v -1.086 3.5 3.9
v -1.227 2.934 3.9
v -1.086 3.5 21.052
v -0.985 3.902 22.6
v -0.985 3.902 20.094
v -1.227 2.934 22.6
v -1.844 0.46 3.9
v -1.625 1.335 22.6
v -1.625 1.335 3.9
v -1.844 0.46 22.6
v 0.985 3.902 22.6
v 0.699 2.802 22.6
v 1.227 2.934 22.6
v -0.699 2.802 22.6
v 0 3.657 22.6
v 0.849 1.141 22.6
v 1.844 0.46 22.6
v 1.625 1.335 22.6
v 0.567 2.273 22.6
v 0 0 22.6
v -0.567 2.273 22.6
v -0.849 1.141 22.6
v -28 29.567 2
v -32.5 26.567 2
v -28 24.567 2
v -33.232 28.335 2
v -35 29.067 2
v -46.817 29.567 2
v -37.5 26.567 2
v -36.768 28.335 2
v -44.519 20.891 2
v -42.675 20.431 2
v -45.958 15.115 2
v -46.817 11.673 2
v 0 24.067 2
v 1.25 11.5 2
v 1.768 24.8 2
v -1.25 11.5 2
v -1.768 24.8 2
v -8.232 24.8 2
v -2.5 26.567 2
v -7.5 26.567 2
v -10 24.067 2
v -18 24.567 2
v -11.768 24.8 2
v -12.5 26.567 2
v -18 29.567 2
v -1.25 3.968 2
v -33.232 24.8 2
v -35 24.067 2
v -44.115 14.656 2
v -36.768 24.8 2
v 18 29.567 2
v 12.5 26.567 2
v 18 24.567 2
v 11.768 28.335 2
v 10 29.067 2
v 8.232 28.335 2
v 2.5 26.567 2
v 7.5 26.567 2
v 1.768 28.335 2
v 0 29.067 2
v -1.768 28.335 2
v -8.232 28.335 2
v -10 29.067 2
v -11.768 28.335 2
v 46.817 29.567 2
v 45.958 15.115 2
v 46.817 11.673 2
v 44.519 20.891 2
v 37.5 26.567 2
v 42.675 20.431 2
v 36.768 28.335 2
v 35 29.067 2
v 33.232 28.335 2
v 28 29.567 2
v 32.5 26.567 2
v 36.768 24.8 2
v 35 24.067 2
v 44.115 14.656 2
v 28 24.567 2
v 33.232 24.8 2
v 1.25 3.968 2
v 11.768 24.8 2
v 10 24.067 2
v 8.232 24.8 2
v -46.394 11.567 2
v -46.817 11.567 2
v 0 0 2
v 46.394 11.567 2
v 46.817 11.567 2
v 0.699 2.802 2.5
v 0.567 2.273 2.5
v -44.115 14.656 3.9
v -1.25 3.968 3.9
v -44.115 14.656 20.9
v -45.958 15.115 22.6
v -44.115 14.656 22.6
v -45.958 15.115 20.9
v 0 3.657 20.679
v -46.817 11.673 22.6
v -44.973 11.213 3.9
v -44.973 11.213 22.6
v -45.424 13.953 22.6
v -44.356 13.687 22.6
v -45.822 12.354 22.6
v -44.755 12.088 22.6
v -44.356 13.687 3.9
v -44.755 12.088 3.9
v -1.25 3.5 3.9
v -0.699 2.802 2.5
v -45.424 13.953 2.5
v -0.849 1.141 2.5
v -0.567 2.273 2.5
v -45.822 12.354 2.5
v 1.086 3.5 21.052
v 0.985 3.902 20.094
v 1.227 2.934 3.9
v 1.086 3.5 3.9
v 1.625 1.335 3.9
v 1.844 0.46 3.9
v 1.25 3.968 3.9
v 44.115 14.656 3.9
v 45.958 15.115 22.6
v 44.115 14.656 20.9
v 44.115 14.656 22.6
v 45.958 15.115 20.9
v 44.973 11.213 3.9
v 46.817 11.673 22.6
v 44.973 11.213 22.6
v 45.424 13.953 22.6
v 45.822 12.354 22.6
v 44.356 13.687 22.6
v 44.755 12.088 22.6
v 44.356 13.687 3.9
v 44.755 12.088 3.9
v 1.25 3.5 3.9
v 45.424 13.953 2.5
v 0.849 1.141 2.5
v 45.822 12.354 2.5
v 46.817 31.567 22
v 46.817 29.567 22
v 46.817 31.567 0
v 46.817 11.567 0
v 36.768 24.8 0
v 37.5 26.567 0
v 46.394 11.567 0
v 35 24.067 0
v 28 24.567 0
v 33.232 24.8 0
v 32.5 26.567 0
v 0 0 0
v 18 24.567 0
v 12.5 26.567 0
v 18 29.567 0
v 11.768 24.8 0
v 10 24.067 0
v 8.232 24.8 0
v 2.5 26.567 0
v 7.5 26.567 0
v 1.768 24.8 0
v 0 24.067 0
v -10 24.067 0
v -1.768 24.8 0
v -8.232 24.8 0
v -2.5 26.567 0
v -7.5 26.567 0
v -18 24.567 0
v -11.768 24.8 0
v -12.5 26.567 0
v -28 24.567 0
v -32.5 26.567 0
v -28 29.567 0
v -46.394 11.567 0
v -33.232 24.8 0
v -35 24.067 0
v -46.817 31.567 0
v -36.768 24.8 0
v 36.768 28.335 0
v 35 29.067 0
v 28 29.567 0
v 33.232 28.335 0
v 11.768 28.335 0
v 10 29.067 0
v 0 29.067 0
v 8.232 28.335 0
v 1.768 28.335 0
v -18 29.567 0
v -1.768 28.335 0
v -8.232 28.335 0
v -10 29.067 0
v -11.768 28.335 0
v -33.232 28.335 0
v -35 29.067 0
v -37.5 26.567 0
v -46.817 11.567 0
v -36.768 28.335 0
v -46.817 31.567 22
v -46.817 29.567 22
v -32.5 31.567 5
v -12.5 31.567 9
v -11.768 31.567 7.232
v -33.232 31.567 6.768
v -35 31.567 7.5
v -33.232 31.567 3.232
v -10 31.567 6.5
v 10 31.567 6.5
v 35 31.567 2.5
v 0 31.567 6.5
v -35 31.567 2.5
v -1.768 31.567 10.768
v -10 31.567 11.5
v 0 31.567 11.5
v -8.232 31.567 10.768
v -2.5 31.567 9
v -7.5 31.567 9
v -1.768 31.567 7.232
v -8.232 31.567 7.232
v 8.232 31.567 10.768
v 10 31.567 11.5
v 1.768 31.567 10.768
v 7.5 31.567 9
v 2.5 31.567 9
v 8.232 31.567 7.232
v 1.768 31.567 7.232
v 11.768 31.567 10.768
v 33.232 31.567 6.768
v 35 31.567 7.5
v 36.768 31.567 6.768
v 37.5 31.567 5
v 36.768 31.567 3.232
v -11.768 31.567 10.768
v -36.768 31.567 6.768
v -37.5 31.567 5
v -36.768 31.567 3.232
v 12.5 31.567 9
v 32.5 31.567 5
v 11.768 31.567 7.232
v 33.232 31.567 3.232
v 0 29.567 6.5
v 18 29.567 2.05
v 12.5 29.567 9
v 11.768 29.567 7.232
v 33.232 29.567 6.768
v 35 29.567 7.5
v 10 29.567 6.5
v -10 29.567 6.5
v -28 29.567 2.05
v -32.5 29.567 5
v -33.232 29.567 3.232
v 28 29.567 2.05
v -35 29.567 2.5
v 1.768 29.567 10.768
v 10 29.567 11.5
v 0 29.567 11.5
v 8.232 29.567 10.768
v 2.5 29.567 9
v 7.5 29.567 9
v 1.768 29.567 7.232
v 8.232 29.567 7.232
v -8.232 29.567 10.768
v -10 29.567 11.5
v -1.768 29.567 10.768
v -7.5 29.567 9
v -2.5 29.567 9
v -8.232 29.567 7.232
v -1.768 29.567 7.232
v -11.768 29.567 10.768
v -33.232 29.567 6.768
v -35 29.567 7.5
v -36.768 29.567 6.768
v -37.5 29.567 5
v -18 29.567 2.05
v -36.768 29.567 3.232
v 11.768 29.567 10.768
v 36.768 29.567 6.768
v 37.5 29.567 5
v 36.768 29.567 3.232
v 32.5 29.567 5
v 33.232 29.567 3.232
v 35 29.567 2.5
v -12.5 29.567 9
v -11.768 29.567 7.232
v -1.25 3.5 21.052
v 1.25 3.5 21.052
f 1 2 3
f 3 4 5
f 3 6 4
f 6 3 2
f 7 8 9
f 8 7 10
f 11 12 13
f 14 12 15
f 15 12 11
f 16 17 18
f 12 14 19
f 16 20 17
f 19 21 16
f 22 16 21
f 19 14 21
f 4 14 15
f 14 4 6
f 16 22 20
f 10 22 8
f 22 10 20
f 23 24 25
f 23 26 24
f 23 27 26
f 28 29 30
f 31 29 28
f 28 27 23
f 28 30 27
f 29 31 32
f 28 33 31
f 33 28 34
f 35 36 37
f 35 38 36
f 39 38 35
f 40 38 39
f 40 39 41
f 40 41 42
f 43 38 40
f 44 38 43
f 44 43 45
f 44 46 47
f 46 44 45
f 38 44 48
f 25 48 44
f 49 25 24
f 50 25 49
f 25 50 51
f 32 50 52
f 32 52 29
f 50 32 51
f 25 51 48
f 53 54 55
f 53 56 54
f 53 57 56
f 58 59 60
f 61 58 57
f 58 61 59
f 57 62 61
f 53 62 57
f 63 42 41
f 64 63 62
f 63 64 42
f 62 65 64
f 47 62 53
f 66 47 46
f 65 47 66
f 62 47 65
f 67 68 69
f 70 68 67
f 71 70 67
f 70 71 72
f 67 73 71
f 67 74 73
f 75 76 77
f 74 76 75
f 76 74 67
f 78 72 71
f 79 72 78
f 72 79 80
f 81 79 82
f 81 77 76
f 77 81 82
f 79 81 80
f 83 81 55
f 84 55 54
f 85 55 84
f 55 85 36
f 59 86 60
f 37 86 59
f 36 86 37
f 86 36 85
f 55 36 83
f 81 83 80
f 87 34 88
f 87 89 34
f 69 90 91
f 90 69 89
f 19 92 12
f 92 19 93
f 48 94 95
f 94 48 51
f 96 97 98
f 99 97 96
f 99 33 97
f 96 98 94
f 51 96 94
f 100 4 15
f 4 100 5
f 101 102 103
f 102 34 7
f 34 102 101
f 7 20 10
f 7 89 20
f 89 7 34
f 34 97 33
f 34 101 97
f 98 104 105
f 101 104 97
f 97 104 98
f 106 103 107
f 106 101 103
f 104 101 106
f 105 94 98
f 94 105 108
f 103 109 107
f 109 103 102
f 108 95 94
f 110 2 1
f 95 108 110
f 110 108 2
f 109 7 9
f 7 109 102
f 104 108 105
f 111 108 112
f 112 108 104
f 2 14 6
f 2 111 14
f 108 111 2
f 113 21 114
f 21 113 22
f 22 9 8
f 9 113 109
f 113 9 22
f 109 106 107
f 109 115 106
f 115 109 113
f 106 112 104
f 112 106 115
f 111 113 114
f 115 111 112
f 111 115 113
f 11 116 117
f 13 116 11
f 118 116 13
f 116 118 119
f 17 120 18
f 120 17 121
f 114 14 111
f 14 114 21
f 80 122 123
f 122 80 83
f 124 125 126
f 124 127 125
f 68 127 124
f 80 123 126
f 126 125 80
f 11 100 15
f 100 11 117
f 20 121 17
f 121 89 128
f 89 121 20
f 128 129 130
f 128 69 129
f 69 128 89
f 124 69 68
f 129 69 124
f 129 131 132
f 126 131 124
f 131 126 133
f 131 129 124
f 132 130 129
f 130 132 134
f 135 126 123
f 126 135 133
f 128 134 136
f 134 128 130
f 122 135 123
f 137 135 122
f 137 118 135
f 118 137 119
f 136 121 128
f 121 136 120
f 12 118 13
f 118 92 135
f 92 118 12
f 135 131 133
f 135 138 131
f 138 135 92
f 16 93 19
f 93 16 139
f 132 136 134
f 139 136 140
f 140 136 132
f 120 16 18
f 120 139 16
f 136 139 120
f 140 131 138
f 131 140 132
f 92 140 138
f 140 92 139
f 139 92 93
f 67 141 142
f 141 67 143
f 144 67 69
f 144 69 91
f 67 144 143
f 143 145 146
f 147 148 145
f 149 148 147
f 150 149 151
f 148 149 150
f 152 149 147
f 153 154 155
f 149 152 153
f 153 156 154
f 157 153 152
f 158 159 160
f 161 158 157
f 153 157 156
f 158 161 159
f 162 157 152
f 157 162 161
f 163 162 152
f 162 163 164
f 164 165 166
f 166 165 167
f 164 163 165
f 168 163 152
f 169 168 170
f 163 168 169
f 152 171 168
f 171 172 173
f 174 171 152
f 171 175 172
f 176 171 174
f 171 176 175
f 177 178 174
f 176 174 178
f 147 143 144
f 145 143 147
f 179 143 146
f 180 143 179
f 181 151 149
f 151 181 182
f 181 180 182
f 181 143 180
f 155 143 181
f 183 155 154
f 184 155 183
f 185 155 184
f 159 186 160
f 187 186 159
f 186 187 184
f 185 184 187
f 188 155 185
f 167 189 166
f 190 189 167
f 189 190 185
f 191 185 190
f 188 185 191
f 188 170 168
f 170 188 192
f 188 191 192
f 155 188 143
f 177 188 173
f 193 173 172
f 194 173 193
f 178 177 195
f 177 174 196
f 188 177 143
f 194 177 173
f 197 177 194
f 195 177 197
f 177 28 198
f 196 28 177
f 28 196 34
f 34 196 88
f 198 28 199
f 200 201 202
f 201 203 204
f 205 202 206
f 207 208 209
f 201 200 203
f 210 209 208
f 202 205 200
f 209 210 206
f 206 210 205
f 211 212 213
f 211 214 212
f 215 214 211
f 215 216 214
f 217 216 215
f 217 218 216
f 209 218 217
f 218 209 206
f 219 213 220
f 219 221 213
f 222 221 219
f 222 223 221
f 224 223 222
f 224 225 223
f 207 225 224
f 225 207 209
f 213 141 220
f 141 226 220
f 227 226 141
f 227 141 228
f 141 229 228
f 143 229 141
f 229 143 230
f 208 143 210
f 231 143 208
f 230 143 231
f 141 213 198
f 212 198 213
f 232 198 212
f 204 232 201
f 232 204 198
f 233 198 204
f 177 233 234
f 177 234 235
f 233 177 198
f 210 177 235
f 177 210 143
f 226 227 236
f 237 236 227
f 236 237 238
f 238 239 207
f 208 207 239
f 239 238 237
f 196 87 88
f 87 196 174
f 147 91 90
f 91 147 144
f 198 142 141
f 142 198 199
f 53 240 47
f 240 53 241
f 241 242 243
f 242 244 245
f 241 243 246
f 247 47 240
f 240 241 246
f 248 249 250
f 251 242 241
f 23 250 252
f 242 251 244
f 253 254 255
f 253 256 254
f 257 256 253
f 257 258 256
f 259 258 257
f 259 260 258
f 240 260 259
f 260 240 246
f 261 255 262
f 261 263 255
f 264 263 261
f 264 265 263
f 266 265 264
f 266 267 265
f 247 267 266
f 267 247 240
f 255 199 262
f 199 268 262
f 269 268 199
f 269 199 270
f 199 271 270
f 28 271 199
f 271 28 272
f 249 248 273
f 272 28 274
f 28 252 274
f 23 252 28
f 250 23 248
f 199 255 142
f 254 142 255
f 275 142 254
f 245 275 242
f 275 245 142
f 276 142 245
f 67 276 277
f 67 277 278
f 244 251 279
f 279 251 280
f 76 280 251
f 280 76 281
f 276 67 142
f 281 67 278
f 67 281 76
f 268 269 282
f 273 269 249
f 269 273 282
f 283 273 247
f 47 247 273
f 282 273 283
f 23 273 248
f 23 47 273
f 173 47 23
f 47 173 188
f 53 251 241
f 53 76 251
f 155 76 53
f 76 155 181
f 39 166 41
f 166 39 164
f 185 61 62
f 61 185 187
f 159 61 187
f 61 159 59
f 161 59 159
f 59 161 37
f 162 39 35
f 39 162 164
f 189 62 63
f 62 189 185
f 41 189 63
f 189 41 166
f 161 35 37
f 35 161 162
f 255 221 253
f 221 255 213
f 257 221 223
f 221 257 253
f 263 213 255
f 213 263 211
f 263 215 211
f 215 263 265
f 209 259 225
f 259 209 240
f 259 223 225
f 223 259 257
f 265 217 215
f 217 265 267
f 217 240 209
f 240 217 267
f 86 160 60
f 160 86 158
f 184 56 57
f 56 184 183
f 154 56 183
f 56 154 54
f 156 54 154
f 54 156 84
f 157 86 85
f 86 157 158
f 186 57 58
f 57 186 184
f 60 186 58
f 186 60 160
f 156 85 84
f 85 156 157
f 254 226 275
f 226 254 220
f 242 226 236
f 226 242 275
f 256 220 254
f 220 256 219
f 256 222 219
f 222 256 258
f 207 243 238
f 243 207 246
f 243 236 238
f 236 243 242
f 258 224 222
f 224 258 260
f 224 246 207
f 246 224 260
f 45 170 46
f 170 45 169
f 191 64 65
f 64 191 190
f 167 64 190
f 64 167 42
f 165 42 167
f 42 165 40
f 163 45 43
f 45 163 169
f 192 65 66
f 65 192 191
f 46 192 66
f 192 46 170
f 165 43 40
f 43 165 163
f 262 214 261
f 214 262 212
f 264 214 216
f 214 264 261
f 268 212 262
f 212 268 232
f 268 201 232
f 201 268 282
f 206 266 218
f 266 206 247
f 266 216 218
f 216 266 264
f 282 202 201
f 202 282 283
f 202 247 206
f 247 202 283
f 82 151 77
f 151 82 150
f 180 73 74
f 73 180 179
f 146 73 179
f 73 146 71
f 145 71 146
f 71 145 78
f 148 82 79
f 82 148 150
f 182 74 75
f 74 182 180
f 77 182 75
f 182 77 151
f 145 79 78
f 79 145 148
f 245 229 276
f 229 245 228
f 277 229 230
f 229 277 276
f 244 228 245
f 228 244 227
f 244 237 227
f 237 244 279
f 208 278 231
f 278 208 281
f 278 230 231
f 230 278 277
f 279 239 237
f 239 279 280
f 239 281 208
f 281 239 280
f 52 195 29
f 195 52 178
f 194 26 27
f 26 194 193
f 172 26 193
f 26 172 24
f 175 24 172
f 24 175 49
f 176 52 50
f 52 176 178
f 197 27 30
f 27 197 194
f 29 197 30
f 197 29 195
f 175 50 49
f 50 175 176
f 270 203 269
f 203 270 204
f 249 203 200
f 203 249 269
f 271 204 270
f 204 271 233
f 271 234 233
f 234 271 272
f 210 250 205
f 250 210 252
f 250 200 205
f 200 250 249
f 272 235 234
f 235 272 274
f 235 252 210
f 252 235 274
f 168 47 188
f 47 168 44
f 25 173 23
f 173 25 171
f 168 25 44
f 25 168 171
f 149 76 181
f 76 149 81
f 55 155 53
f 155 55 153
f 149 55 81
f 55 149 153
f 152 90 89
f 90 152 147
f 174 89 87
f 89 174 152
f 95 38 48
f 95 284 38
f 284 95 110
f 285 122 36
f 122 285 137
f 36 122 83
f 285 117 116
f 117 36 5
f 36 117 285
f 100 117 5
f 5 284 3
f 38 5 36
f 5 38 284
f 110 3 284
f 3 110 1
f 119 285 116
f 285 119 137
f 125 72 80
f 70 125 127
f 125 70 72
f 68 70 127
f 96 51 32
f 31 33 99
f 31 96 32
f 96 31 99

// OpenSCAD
// file: Common.scad
/* Constants */
// HC49S
HC49S_BASE_X = 10.3; // mm
HC49S_BASE_Y = 4.6; // mm
HC49S_BASE_HEIGHT = 3.8; // mm
HC49S_CRYSTAL_Y = HC49S_BASE_Y - 0.8;

/* Crystal (HC49S) */
module Crystal_HC49S()
{
    CENTER_OFFSET = HC49S_BASE_X / 2 - HC49S_BASE_Y / 2;
    color("silver") union()
	{
		// Base
		hull()
		{
			translate([-CENTER_OFFSET, 0, 0]) cylinder(r=HC49S_BASE_Y/2, h=0.4, $fn=60);
			translate([CENTER_OFFSET, 0, 0]) cylinder(r=HC49S_BASE_Y/2, h=0.4, $fn=60);
		}
	
		// Crystal
		hull()
		{
			translate([-CENTER_OFFSET, 0, 0]) cylinder(r=HC49S_CRYSTAL_Y/2, h=HC49S_BASE_HEIGHT, $fn=60);
			translate([CENTER_OFFSET, 0, 0]) cylinder(r=HC49S_CRYSTAL_Y/2, h=HC49S_BASE_HEIGHT, $fn=60);
		}
	}
}

//Crystal_HC49S();
// file: HC-SR04.scad
/*
    Dimensions taken from:
    - https://cdn.sparkfun.com/datasheets/Sensors/Proximity/HCSR04.pdf
    - https://howtomechatronics.com/wp-content/uploads/2022/02/HC-SR04-Ultrasonic-Sensor-Dimensions.png
*/

include <Common.scad>

/* Constants */
// PCB
HC_SR04_PCB_COLOR = "#00467E";
HC_SR04_PCB_X = 45; // mm
HC_SR04_PCB_Y = 20; // mm
HC_SR04_PCB_Z = 1.6; // mm (thickness)
// Sensor
HC_SR04_SENSOR_HEIGHT = 12.0; // mm
HC_SR04_SENSOR_DIAMETER = 16.0; // mm
HC_SR04_SENSOR_INNER_DIAMETER = HC_SR04_SENSOR_DIAMETER - 2.0; // (Estimate, does not matter)
// Pin header
HC_SR04_PIN_PITCH = 2.54; // mm
HC_SR04_PIN_SIZE = 0.6; // mm
HC_SR04_PIN_BASE = HC_SR04_PIN_PITCH;
HC_SR04_PIN_TURN_LENGTH = 8; // mm

// Ultrasonic sensor
module HC_SR04_Sensor()
{
   	union()
	{
		color("silver") difference()
		{
			// Main part
			cylinder(r=HC_SR04_SENSOR_DIAMETER/2, h=HC_SR04_SENSOR_HEIGHT, $fn=80);
			// Remove the inner part
			cylinder(r=HC_SR04_SENSOR_INNER_DIAMETER/2, h=HC_SR04_SENSOR_HEIGHT+0.1, $fn=80);
		}

		// The sensor mesh
		color("grey") cylinder(r=HC_SR04_SENSOR_INNER_DIAMETER/2, h=HC_SR04_SENSOR_HEIGHT - 0.2, $fn=80);
	}
}

module HC_SR04_Sensor_Pin()
{

    // Pin through PCB
	color("silver") translate([HC_SR04_PIN_PITCH/2-HC_SR04_PIN_SIZE/2,HC_SR04_PIN_PITCH/2-HC_SR04_PIN_SIZE/2,-3]) cube([HC_SR04_PIN_SIZE,HC_SR04_PIN_SIZE, 5]);
    
    // Pin 90-degree
	color("silver") translate([HC_SR04_PIN_PITCH/2-HC_SR04_PIN_SIZE/2,HC_SR04_PIN_PITCH/2-HC_SR04_PIN_SIZE/2 - HC_SR04_PIN_TURN_LENGTH,-3]) cube([HC_SR04_PIN_SIZE, HC_SR04_PIN_TURN_LENGTH, HC_SR04_PIN_SIZE]);
    
    // Plastic base
	color("black") translate([0,0,-1]) cube([HC_SR04_PIN_PITCH, HC_SR04_PIN_PITCH, 1]);
}


// Main PCB + components
module HC_SR04(up=false, center_x=false)
{
    rotate([up ? 90 : 0, 0, 0]) translate([center_x ? -HC_SR04_PCB_X/2 : 0,0,0]) union()
    {
        // PCB
        color(HC_SR04_PCB_COLOR) cube([HC_SR04_PCB_X,HC_SR04_PCB_Y,HC_SR04_PCB_Z]);
        // Ultrasonic sensors
        translate([HC_SR04_PCB_Y/2 - 0.6, HC_SR04_PCB_Y/2, HC_SR04_PCB_Z]) HC_SR04_Sensor();
        translate([HC_SR04_PCB_X - HC_SR04_PCB_Y/2 + 0.6, HC_SR04_PCB_Y/2, HC_SR04_PCB_Z]) HC_SR04_Sensor();
        // Crystal
        translate([HC_SR04_PCB_X/2, HC_SR04_PCB_Y-HC49S_BASE_Y, HC_SR04_PCB_Z]) Crystal_HC49S();
        // Pins
        
        for (i = [-1:2])
        {
            translate([(HC_SR04_PCB_X/2) - (HC_SR04_PIN_PITCH*i),2, 0]) HC_SR04_Sensor_Pin();
        }
        
    }
}

//HC_SR04();
// main file
include <HC-SR04.scad>

/* Constants */
// Mount
MOUNT_THICCNESS = 1.1; // mm
MOUNT_HOLDEXTRA = 0.8; // mm (Amount held around sensor)

HC_SR04_SCALE = 1.03; // 3% bigger sensor for 3d-print tolerances I guess?

MOUNT_S = MOUNT_THICCNESS + MOUNT_HOLDEXTRA;
SENSOR_X = HC_SR04_PCB_X * HC_SR04_SCALE;
SENSOR_Y = HC_SR04_PCB_Z * HC_SR04_SCALE;
SENSOR_Z = HC_SR04_PCB_Y * HC_SR04_SCALE;
MOUNT_W = SENSOR_X + MOUNT_S;

MOUNT_SENSOR_ANGLE = -14; // Degrees from center (15 should be "ideal" in theory, but use 14 for tolerances)

BASE_S = 2; // mm
BASE_IN = 20; // mm
BASE_BACK_HEIGHT = 20;

module HC_SR04_Mount()
{   
    difference()
    {
        union()
        {
            // Left
            cube([MOUNT_S, MOUNT_S + SENSOR_Y, SENSOR_Z]);
            // Right
            translate([SENSOR_X, 0, 0]) cube([MOUNT_S, MOUNT_S + SENSOR_Y, SENSOR_Z]);
            // Bottom
            cube([MOUNT_S + SENSOR_X, MOUNT_S + SENSOR_Y, MOUNT_S]);
        }
        
        // HC-SR04 used for difference
        translate([SENSOR_X + MOUNT_THICCNESS, HC_SR04_PCB_Z + MOUNT_S / 2, HC_SR04_PCB_Y + MOUNT_THICCNESS]) rotate([90, 180, 0]) scale([HC_SR04_SCALE, HC_SR04_SCALE, HC_SR04_SCALE]) # HC_SR04();
    }
}

// Right angled extruded triangle
module HC_SR04_Mount_Support(angle)
{
    linear_extrude(height=1, center=true)
    {
        polygon(points=[[0, 0], [1, 0], [0, tan(angle) * 1]], paths=[[0, 1, 2]]);
    }
}

module Mount_Hole()
{
    translate([0, 0, 0]) cylinder(h=12, r=5/2, center=true);
    translate([0, 5, 6]) rotate([90, 0, 0]) cylinder(h=10, r=5/2, center=true);
}

union()
{
    // Sensor mount right
    translate([0, 0, BASE_S]) mirror([1,0,0]) rotate([0,0, -MOUNT_SENSOR_ANGLE]) HC_SR04_Mount();
    // Sensor mount left
    translate([0, 0, BASE_S]) rotate([0,0, -MOUNT_SENSOR_ANGLE])  HC_SR04_Mount();
    
    // Sensor base
    hull()
    {
       rotate([0,0, -MOUNT_SENSOR_ANGLE]) cube([MOUNT_W, MOUNT_S + SENSOR_Y, BASE_S]);
       mirror([1,0,0]) rotate([0,0, -MOUNT_SENSOR_ANGLE]) cube([MOUNT_W, MOUNT_S + SENSOR_Y, BASE_S]);
    }
    
    // Base
    ROTATED_SENSOR_X = cos(MOUNT_SENSOR_ANGLE) * (MOUNT_S + SENSOR_X);
    ROTATED_SENSOR_Y = cos(MOUNT_SENSOR_ANGLE) * (MOUNT_S + SENSOR_Y) - sin(MOUNT_SENSOR_ANGLE) * (MOUNT_S + SENSOR_X) - (MOUNT_S + SENSOR_Y);

    difference()
    {
        union()
        {
            // Bottom
            translate([-ROTATED_SENSOR_X,ROTATED_SENSOR_Y, 0]) cube([ROTATED_SENSOR_X * 2, BASE_IN, BASE_S]);   
            // Back
            translate([-ROTATED_SENSOR_X,ROTATED_SENSOR_Y + BASE_IN - BASE_S, BASE_S]) cube([ROTATED_SENSOR_X * 2, BASE_S, BASE_BACK_HEIGHT]);  
        }
        
        // Middle hole
        translate([0, ROTATED_SENSOR_Y + BASE_IN - 5, 3]) Mount_Hole();
        // Left hole
        translate([10, ROTATED_SENSOR_Y + BASE_IN - 5, 3]) Mount_Hole();
        // Right hole
        translate([-10, ROTATED_SENSOR_Y + BASE_IN - 5, 3]) Mount_Hole();
        
        // Left hole 2
        translate([10 + 25, ROTATED_SENSOR_Y + BASE_IN - 5, -1]) Mount_Hole();
        // Right hole 2
        translate([-10 - 25, ROTATED_SENSOR_Y + BASE_IN- 5, -1]) Mount_Hole();
        
        // Remove right for clip?
        translate([-23, ROTATED_SENSOR_Y + BASE_IN - 4.5, -1]) cube([10, 5, BASE_S + 4.1], center=true);
        // Remove left for clip?
        translate([23, ROTATED_SENSOR_Y + BASE_IN - 4.5, -1]) cube([10, 5, BASE_S + 4.1], center=true);
    }
    
    // Middle sensor support
    translate([0, 3.5, BASE_S]) rotate([90, 0, 90]) scale([8, 11, 2.5]) HC_SR04_Mount_Support(60);
    
    // Left sensor support
    rotate([90, 0, 90-MOUNT_SENSOR_ANGLE]) translate([3.5, BASE_S, SENSOR_X + MOUNT_S/2])  scale([6, 11, MOUNT_S]) HC_SR04_Mount_Support(60);
    
    // Right sensor support
    mirror([1,0,0]) rotate([90, 0, 90-MOUNT_SENSOR_ANGLE]) translate([3.5, BASE_S, SENSOR_X + MOUNT_S/2])  scale([6, 11, MOUNT_S]) HC_SR04_Mount_Support(60); 
}
